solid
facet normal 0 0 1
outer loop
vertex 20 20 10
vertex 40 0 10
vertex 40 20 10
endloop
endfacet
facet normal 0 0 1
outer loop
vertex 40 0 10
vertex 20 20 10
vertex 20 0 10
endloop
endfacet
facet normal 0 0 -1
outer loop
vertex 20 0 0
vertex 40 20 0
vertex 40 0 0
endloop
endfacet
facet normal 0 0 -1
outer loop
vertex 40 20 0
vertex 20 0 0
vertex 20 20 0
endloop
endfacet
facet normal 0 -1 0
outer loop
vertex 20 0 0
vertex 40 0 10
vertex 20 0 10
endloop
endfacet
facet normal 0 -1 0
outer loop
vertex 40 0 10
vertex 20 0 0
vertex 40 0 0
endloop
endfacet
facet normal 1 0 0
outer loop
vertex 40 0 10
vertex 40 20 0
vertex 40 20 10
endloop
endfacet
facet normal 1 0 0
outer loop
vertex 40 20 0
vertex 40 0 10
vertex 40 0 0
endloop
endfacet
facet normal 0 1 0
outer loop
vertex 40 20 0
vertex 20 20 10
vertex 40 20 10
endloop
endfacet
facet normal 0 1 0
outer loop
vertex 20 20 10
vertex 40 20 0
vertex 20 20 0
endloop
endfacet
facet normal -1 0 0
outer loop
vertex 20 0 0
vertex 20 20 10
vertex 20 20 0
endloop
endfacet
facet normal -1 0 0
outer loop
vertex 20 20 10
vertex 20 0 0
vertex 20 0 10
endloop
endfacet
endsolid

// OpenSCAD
$fa = 8; $fs = 1;
translate([20, 0, 0]) cube([20, 20, 10]);
